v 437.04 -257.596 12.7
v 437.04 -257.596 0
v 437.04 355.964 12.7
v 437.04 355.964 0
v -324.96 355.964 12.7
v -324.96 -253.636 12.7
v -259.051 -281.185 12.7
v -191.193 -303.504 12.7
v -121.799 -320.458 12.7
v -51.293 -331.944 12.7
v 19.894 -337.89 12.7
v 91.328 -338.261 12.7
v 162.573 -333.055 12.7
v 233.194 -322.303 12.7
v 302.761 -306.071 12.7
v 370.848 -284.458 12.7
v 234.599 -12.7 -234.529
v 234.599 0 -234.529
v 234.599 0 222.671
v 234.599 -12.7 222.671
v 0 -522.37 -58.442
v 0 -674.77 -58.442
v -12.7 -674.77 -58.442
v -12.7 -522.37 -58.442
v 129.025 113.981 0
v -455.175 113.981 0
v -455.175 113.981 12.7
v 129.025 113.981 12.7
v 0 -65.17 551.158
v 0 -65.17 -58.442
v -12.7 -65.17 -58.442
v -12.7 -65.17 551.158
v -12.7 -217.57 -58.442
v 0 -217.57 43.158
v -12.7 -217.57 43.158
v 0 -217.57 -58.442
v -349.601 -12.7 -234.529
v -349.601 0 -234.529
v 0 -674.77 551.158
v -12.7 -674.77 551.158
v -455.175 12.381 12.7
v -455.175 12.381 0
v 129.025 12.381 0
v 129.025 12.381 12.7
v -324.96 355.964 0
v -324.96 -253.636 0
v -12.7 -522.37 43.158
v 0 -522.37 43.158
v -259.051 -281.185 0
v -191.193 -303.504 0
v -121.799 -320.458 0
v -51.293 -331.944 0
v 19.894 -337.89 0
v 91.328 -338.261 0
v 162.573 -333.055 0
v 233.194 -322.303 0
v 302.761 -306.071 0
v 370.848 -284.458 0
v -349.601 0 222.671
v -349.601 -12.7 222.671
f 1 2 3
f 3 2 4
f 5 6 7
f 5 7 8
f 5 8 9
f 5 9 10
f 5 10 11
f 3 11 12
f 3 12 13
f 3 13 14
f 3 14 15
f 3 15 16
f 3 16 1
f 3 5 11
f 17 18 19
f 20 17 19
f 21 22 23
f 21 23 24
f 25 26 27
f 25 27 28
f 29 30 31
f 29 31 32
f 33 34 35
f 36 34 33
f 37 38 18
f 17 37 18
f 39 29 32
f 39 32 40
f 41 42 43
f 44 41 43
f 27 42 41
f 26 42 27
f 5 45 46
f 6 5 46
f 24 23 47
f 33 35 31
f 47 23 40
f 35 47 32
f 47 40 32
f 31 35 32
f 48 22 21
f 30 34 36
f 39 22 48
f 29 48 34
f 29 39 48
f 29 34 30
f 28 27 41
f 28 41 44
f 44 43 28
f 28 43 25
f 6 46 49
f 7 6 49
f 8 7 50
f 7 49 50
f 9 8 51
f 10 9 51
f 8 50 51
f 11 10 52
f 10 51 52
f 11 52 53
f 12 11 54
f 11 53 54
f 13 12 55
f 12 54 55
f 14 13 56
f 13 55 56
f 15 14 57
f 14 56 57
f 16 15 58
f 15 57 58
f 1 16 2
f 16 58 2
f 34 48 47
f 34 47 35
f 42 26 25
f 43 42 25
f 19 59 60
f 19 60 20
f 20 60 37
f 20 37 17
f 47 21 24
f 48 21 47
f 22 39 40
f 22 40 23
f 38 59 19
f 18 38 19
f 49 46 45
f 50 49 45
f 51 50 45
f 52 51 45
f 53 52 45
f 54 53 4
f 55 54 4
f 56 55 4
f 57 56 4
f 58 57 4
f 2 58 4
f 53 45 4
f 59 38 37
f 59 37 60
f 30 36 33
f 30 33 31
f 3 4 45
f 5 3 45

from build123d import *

# Parameters (mm, degrees)
F1_DEPTH = 12.7
F3_DEPTH = 12.7
F4_W     = 584.2
F4_H     = 457.2
F5_DEPTH = 12.7
F6_W     = 584.2
F6_H     = 101.6
F7_DEPTH = 12.7


with BuildPart() as f1:
    # F0 (on Top) → F1 (new body)
    with BuildSketch(Plane.XY):
        with BuildLine():
            Line((437.039518, 355.96361), (-324.960482, 355.96361))
            Line((-324.960482, 355.96361), (-324.960482, -253.63639))
            ThreePointArc((-324.960482, -253.63639), (55.607429, -338.773453), (437.039518, -257.595773))
            Line((437.039518, -257.595773), (437.039518, 355.96361))
        make_face()
    extrude(amount=F1_DEPTH)


with BuildPart() as f3:
    # F2 (on Right) → F3 (new body)
    with BuildSketch(Plane.YZ):
        Polygon((-65.170189, 551.157992), (-674.770189, 551.157992), (-674.770189, -58.442008), (-522.370189, -58.442008), (-522.370189, 43.157992), (-217.570189, 43.157992), (-217.570189, -58.442008), (-65.170189, -58.442008), align=None)
    extrude(amount=-F3_DEPTH)


with BuildPart() as f5:
    # F4 (on Front) → F5 (new body)
    with BuildSketch(Plane.XZ):
        with Locations((-57.500612, -5.929083)):
            Rectangle(F4_W, F4_H)
    extrude(amount=F5_DEPTH)


with BuildPart() as f7:
    # F6 (on Top) → F7 (new body)
    with BuildSketch(Plane.XY):
        with Locations((-163.075032, 63.181399)):
            Rectangle(F6_W, F6_H)
    extrude(amount=F7_DEPTH)


solid = Compound([f1.part, f3.part, f5.part, f7.part])
